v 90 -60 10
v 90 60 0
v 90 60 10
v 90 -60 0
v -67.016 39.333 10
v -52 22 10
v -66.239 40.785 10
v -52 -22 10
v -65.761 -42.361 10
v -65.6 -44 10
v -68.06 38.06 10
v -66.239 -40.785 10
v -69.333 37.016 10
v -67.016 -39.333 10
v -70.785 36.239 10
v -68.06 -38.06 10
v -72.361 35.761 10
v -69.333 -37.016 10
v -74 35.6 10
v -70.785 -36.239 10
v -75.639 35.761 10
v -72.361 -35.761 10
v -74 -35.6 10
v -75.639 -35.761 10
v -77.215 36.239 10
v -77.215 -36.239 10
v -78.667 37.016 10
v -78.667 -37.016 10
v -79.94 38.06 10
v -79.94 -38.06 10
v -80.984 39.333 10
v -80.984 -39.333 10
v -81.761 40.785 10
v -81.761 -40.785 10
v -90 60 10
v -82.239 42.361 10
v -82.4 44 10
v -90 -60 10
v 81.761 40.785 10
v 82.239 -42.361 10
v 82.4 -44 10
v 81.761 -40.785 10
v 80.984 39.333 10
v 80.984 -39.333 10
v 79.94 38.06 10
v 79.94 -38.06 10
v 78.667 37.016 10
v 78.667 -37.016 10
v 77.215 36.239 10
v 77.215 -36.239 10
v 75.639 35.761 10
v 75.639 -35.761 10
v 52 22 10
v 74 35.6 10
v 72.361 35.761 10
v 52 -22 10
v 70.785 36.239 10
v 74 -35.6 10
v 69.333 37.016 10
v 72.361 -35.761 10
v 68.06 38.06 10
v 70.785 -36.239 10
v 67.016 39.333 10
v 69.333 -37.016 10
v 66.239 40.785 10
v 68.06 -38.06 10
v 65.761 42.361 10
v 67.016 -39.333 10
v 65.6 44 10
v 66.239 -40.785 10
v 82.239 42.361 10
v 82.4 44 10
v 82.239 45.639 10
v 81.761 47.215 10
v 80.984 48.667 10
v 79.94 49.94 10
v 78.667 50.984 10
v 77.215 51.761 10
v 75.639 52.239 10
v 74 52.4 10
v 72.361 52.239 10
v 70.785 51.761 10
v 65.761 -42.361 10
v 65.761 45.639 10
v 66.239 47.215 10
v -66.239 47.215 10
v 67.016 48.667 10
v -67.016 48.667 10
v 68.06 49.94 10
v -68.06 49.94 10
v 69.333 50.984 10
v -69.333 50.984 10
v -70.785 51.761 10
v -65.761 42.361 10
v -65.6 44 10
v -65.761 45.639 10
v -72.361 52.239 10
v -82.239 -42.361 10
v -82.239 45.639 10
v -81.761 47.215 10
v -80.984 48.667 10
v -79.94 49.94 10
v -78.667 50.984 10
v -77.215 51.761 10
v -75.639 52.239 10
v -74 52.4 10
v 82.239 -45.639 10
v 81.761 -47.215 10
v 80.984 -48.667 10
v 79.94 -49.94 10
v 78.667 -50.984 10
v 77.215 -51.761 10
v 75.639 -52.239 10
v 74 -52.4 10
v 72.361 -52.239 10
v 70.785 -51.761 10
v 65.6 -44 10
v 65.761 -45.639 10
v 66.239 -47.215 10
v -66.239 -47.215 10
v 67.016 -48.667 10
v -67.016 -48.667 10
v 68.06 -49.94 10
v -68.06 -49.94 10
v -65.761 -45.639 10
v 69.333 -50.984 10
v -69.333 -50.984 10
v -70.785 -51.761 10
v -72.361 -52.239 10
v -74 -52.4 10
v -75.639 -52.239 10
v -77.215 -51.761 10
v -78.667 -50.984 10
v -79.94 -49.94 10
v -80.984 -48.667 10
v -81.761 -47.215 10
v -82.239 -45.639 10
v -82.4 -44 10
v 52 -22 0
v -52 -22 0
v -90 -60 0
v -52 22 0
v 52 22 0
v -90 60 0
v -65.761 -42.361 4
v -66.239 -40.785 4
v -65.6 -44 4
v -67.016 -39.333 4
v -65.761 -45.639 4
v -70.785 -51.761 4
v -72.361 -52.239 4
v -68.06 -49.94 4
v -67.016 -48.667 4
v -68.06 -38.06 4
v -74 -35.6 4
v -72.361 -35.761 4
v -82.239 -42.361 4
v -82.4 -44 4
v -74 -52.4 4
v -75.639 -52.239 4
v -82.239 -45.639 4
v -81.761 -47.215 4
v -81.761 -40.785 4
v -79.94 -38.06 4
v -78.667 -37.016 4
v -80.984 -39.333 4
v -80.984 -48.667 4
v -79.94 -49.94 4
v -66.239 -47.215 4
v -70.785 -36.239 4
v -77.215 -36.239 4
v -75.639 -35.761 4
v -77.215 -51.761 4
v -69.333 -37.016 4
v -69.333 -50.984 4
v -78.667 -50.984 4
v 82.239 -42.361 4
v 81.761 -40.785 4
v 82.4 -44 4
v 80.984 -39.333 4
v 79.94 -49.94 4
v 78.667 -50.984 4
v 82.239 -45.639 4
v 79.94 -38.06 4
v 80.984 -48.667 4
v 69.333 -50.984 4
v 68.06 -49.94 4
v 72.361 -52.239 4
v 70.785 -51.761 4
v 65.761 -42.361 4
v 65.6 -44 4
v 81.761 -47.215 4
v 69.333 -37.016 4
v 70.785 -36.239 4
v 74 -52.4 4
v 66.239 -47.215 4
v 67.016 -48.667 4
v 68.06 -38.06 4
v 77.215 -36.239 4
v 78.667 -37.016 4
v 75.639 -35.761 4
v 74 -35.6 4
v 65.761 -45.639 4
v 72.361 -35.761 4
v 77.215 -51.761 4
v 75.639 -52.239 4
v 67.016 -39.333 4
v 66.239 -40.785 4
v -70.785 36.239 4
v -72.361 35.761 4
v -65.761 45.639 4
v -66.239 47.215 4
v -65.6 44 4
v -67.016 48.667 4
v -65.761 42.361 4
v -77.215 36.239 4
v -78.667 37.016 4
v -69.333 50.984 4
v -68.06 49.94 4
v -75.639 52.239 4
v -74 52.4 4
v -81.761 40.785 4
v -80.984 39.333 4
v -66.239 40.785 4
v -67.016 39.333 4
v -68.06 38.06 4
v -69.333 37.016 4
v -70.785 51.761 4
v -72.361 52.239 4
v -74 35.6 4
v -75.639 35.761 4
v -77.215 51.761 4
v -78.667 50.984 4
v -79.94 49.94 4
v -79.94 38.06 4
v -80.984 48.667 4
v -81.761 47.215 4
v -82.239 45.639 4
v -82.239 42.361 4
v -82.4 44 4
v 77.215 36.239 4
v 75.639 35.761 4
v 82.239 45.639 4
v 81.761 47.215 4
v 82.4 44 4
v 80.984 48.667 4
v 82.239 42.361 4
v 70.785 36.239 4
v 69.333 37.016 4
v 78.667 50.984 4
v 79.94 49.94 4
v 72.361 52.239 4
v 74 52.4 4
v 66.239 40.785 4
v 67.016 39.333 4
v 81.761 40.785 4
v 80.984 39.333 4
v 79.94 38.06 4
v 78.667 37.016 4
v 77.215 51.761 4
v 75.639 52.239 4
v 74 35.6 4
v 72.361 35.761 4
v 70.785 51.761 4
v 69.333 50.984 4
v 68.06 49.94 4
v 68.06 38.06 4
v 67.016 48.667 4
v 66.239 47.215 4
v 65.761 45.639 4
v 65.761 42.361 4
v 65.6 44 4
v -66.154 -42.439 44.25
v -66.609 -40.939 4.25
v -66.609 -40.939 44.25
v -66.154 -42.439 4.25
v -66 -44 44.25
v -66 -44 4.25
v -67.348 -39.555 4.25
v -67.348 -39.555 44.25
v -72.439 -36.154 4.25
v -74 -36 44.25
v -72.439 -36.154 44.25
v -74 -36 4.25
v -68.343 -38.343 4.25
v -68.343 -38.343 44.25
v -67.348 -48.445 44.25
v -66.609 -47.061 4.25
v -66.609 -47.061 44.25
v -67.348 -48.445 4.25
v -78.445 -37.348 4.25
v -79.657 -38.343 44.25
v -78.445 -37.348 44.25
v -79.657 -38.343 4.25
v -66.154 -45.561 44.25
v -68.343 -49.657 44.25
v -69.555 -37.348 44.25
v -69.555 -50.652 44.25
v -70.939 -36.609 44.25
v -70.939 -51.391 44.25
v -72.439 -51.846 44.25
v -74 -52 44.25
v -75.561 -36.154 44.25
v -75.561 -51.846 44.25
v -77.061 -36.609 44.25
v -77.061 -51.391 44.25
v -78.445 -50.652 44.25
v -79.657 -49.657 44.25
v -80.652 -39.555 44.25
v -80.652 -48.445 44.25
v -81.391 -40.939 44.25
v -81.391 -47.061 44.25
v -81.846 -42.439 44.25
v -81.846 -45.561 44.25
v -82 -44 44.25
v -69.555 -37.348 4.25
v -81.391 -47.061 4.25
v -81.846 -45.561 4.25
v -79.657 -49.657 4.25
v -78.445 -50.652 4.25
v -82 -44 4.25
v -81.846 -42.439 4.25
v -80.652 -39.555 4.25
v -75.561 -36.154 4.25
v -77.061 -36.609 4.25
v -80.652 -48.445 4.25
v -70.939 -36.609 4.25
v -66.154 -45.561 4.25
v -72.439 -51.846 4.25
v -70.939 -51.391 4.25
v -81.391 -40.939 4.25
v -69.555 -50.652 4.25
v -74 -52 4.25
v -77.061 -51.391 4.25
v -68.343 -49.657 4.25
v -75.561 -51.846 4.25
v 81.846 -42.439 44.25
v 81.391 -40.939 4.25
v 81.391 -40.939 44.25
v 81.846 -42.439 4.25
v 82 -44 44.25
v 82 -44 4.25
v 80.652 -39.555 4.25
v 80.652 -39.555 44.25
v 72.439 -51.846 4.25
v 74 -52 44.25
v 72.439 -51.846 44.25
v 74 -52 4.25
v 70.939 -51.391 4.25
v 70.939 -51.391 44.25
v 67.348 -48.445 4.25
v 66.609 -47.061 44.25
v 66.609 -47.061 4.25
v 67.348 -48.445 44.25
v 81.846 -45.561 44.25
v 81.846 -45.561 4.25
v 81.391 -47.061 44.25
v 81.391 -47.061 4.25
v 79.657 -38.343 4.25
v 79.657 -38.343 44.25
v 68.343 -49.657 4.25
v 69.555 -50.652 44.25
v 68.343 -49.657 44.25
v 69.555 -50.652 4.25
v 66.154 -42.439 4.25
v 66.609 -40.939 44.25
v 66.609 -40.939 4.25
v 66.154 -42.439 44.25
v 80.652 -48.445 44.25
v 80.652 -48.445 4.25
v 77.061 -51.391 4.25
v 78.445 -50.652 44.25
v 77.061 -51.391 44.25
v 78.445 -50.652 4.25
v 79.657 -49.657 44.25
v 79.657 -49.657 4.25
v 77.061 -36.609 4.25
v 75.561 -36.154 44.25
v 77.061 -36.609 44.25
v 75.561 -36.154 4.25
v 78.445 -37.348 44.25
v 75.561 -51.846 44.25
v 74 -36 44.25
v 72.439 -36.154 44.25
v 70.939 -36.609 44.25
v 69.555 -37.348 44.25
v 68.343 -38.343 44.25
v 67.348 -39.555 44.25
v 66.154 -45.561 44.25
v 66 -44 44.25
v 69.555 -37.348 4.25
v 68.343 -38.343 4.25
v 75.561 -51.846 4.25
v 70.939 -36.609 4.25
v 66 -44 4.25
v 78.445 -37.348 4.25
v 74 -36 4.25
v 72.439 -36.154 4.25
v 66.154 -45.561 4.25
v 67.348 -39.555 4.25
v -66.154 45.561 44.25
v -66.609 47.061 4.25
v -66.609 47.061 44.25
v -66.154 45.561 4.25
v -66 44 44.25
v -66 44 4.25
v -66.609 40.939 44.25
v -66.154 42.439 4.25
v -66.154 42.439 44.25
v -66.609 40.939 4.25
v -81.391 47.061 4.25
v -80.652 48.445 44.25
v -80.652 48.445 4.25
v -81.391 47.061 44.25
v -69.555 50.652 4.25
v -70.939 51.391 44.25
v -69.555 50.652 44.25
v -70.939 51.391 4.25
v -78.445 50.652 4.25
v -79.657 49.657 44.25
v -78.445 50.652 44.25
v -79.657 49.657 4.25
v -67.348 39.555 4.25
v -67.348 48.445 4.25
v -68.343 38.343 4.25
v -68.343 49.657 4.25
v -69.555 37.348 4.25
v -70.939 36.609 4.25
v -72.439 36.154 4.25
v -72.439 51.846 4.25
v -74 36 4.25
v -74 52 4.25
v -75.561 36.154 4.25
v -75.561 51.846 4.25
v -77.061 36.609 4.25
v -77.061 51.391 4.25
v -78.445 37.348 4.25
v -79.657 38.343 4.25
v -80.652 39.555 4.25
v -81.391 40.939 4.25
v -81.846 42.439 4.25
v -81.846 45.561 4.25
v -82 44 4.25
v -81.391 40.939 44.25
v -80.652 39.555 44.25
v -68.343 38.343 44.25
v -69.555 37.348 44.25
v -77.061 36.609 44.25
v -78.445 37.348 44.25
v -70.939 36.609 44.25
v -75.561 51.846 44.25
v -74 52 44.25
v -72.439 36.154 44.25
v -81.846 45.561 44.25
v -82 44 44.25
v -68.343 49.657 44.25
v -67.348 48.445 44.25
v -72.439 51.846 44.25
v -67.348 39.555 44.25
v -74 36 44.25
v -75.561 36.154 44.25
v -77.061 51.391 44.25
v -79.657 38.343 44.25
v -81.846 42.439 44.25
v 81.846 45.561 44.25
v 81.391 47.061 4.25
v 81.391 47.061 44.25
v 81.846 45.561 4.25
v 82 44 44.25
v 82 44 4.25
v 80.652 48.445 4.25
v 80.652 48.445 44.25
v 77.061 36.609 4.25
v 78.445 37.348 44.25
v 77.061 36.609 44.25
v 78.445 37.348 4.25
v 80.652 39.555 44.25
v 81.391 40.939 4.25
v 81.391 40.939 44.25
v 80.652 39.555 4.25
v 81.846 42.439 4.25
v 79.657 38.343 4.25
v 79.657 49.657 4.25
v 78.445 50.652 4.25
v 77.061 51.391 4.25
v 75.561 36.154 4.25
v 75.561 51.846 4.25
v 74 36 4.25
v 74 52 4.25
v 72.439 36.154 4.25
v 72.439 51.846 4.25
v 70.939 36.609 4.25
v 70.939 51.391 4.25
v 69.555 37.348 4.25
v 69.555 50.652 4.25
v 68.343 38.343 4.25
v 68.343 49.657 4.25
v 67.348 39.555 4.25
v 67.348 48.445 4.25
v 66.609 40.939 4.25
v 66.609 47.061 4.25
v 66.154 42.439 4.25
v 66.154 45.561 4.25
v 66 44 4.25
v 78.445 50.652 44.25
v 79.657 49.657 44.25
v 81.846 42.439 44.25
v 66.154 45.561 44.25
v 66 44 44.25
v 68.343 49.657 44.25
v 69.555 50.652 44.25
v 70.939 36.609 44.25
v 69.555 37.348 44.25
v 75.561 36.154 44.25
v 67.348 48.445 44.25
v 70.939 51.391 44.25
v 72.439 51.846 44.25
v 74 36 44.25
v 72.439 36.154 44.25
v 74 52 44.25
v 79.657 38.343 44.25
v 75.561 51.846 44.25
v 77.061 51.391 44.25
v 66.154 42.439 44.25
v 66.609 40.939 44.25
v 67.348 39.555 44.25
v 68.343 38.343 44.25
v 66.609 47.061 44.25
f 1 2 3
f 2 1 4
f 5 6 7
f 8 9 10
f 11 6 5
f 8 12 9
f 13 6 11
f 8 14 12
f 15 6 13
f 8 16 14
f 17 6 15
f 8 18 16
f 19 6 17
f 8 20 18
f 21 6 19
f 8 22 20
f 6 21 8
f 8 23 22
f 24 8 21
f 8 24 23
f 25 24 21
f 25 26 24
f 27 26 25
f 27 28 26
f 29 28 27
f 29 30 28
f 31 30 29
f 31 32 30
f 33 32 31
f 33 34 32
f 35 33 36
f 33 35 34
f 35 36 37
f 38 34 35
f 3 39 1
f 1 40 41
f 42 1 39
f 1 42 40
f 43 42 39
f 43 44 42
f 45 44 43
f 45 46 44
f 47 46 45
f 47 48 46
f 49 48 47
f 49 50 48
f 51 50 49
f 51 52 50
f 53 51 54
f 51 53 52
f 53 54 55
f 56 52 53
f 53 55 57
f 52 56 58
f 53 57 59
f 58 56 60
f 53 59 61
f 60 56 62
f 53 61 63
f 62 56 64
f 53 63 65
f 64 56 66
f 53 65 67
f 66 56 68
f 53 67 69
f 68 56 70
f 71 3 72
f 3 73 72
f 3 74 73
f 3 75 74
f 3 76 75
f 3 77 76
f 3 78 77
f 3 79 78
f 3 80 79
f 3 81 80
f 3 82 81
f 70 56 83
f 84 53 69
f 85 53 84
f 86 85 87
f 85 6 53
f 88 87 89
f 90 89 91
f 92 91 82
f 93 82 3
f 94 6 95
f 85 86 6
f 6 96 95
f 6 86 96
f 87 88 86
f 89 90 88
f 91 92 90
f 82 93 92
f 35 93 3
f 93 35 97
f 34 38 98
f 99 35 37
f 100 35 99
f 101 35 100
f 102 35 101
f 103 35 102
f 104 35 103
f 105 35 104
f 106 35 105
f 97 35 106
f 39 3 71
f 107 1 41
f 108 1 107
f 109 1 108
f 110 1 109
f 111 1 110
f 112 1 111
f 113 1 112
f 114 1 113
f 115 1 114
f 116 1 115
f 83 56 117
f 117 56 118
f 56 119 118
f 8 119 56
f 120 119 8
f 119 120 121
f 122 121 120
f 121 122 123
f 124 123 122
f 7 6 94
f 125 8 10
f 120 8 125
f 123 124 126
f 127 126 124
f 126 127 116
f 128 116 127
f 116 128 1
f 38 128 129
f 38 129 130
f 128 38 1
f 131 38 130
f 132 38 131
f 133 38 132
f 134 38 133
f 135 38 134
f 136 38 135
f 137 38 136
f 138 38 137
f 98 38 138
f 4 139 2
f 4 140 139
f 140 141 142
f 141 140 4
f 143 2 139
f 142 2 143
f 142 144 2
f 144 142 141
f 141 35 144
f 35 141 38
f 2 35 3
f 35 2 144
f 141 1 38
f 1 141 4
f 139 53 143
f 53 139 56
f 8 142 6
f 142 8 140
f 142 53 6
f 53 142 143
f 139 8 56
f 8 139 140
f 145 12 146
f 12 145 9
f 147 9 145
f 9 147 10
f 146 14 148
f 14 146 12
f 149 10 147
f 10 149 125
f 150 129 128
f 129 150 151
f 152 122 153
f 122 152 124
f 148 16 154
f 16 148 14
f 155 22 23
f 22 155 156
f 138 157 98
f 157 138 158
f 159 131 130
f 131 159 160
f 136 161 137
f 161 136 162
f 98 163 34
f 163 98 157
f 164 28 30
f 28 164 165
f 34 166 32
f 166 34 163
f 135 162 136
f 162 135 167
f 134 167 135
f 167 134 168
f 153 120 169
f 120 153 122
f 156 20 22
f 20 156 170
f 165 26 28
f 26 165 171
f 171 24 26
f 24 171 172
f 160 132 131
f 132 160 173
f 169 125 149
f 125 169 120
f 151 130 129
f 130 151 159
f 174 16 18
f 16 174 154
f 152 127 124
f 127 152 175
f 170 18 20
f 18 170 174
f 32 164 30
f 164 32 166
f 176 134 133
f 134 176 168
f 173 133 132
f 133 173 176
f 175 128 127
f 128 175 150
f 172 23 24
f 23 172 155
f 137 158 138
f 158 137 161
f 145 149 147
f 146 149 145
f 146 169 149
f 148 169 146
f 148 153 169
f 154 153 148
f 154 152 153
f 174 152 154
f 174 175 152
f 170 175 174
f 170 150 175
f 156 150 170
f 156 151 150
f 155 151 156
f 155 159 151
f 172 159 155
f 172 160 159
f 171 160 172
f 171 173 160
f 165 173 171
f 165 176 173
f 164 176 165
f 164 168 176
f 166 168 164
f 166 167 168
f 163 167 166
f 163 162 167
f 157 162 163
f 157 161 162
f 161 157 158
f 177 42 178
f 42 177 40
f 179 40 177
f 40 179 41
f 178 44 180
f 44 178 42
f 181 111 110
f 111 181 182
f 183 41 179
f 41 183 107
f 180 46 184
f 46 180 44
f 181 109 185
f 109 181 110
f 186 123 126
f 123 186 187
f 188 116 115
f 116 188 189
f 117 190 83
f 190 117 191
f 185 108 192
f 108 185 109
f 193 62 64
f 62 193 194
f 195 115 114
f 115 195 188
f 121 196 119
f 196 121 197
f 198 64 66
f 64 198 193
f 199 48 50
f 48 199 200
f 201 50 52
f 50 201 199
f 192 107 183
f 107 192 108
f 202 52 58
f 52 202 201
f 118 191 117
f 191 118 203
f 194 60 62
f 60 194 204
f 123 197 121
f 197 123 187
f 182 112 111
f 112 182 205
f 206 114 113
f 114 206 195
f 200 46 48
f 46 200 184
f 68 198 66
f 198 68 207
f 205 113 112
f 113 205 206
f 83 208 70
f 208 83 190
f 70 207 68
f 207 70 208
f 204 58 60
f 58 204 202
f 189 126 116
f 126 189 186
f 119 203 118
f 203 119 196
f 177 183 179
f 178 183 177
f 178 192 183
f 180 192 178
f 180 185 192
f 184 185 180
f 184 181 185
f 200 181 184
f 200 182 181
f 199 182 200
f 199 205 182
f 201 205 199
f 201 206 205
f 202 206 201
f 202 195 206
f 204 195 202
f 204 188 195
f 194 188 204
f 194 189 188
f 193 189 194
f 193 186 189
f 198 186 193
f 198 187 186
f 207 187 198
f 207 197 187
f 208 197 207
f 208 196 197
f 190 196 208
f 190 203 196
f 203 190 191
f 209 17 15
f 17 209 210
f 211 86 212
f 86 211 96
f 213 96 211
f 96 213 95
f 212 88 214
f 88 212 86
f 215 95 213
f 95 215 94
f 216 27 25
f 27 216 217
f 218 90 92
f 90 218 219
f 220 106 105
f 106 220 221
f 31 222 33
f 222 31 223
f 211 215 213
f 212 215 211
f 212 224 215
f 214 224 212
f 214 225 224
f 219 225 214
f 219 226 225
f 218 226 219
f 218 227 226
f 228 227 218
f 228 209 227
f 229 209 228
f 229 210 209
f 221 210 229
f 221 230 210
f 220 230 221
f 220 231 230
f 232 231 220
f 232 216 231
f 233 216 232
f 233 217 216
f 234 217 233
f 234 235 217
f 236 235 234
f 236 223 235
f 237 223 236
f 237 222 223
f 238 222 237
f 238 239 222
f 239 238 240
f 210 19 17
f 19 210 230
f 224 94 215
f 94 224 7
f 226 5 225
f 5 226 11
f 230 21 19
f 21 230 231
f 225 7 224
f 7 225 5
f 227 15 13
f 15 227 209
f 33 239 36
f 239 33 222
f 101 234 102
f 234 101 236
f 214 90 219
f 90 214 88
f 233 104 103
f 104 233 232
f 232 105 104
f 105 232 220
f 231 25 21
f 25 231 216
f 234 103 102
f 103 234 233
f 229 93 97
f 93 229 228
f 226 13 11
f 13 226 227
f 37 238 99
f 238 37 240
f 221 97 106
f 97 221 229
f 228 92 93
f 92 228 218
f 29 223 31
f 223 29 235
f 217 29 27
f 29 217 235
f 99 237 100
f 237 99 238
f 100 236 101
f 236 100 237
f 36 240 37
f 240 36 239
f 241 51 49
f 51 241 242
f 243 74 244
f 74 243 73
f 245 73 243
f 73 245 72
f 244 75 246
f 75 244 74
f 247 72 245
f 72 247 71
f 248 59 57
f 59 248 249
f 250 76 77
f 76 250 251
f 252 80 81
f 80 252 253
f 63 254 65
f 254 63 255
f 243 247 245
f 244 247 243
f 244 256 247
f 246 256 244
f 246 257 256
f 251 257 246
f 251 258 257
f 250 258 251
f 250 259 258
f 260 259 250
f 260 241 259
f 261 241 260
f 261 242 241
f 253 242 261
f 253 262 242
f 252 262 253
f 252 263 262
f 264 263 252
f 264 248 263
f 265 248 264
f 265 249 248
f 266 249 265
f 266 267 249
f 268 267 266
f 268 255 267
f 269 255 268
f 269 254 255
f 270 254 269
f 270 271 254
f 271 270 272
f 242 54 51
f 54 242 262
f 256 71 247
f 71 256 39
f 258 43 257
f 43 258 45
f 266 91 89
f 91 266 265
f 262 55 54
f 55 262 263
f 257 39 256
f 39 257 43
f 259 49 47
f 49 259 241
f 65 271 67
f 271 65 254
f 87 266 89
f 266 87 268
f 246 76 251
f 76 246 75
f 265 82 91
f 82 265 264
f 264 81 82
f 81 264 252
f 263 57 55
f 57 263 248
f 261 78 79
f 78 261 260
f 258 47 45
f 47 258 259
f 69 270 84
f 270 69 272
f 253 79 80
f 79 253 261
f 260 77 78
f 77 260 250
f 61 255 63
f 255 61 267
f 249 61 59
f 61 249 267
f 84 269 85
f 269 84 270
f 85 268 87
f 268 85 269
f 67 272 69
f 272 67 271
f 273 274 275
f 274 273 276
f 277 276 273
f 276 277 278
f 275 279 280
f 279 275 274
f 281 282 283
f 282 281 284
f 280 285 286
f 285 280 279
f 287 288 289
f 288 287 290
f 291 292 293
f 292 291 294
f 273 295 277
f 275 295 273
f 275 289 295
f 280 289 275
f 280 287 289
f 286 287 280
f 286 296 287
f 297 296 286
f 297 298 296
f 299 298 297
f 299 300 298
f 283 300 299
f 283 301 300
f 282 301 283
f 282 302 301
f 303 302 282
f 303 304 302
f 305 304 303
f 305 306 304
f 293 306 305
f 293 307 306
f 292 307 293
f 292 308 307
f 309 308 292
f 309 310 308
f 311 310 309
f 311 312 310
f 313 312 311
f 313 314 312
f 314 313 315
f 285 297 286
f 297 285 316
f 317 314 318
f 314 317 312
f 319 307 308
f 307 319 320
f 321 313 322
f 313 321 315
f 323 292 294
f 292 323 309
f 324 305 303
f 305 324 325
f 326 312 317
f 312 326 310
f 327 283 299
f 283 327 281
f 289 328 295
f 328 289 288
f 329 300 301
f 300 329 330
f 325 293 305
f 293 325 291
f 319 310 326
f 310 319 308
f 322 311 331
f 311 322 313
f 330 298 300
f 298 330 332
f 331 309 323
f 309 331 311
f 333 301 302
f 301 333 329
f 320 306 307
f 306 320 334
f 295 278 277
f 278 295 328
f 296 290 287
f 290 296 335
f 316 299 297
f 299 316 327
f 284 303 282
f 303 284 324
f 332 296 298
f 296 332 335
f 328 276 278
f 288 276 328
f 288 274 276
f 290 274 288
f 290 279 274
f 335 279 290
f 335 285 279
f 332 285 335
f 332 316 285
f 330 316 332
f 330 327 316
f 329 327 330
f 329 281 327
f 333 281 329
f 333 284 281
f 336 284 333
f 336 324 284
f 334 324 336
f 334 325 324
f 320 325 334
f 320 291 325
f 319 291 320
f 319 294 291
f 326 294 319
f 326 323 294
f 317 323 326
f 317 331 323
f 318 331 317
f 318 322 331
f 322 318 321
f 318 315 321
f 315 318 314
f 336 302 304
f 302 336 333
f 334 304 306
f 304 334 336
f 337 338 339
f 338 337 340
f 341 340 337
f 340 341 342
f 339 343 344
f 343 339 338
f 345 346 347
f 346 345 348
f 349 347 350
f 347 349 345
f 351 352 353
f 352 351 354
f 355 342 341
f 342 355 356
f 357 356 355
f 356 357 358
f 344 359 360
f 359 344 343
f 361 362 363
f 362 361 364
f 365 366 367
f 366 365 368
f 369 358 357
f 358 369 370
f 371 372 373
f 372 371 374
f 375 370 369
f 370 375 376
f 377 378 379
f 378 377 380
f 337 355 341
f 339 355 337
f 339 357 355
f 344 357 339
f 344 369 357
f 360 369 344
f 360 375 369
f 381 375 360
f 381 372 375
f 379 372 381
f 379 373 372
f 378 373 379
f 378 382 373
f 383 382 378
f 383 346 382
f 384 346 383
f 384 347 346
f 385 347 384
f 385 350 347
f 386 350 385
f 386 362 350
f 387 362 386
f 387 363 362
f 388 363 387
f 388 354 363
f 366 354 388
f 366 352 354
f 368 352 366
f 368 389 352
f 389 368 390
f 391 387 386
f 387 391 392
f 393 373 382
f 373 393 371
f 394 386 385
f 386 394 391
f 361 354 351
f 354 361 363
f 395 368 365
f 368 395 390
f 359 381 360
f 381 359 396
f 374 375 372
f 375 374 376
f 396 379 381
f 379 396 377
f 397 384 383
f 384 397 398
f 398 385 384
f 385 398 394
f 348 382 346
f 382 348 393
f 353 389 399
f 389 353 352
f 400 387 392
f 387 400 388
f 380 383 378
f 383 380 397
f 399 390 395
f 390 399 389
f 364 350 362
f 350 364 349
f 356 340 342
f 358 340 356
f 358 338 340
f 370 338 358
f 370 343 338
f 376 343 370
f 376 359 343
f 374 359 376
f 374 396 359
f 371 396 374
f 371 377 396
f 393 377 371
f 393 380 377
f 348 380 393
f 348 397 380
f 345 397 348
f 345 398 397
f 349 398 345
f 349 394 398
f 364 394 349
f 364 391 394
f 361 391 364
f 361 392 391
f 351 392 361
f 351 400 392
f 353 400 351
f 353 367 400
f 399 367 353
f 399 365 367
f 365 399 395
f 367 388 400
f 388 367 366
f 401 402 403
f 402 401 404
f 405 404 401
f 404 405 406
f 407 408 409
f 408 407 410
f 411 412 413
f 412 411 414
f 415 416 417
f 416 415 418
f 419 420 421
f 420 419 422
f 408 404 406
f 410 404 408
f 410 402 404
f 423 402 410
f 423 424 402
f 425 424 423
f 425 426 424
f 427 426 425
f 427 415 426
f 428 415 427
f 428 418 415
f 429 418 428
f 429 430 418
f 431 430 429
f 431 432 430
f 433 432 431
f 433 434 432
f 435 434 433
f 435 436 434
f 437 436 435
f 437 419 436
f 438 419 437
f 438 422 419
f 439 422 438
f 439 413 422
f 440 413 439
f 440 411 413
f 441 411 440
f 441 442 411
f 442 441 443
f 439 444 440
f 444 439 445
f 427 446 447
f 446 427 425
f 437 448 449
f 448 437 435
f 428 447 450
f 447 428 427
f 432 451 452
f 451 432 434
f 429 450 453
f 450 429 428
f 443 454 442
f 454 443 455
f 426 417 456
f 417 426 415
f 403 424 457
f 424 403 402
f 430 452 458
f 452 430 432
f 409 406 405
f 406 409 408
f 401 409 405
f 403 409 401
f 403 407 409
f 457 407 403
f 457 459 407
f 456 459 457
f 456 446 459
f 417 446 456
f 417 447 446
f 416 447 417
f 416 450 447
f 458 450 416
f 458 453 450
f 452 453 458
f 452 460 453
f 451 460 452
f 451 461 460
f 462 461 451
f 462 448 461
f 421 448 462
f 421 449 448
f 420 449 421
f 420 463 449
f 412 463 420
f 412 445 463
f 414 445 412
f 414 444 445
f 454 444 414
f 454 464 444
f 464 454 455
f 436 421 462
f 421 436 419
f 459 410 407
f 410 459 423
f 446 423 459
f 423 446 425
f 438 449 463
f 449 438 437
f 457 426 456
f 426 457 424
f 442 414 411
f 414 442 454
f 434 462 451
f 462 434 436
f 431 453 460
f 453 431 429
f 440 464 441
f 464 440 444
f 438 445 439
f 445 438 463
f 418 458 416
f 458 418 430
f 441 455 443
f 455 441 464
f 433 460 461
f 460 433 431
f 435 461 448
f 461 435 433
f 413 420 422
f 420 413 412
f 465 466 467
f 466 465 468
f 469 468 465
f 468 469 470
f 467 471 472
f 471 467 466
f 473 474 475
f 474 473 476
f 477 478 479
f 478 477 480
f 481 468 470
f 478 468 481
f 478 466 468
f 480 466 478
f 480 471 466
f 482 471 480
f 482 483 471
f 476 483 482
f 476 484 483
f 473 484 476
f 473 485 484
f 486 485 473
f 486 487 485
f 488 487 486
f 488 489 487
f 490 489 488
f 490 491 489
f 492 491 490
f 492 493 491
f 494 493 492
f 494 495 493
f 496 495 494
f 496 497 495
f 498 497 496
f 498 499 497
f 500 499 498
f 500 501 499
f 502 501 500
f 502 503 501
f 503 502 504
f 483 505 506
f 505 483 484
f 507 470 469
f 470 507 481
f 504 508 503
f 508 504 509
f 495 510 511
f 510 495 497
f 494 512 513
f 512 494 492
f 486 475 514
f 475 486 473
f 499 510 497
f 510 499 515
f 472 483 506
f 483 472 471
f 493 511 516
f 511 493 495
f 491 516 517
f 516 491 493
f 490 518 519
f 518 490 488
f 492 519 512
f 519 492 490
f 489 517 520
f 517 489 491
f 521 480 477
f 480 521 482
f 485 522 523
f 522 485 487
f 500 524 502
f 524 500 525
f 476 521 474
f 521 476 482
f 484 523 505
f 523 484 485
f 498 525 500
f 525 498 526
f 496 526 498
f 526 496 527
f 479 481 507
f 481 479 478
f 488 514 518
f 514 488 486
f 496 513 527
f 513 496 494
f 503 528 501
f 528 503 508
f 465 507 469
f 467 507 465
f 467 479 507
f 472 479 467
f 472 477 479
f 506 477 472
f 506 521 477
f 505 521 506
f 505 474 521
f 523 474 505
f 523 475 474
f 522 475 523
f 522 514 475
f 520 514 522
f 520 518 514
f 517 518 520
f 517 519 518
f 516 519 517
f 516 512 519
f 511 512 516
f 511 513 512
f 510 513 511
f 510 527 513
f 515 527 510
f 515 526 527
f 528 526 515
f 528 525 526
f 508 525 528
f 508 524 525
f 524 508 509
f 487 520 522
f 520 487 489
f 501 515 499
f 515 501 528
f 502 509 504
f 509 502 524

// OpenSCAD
$fn = 32;

// ------------------------------------------------------------------------
// Frame with four posts: 180 x 120 mm frame, four d16 posts
// Every part is its own module, assembly() places them once.
// ------------------------------------------------------------------------

// --- part 1 ---
module base_frame() {
  difference() {
    translate([-90, -60, 0]) cube([180, 120, 10]);
    translate([-52, -22, -1]) cube([104, 44, 12]);
    translate([-74, -44, 4]) cylinder(h = 7, d = 16.8);
    translate([74, -44, 4]) cylinder(h = 7, d = 16.8);
    translate([-74, 44, 4]) cylinder(h = 7, d = 16.8);
    translate([74, 44, 4]) cylinder(h = 7, d = 16.8);
  }
}

// --- part 2 ---
module post1() {
  cylinder(h = 40, d = 16);
}

// --- part 3 ---
module post2() {
  cylinder(h = 40, d = 16);
}

// --- part 4 ---
module post3() {
  cylinder(h = 40, d = 16);
}

// --- part 5 ---
module post4() {
  cylinder(h = 40, d = 16);
}

// --- assembly ---
module assembly() {
  translate([0, 0, 0]) rotate([0, 0, 0]) base_frame();
  translate([-74, -44, 4.25]) rotate([0, 0, 0]) post1();
  translate([74, -44, 4.25]) rotate([0, 0, 0]) post2();
  translate([-74, 44, 4.25]) rotate([0, 0, 0]) post3();
  translate([74, 44, 4.25]) rotate([0, 0, 0]) post4();
}

assembly();
